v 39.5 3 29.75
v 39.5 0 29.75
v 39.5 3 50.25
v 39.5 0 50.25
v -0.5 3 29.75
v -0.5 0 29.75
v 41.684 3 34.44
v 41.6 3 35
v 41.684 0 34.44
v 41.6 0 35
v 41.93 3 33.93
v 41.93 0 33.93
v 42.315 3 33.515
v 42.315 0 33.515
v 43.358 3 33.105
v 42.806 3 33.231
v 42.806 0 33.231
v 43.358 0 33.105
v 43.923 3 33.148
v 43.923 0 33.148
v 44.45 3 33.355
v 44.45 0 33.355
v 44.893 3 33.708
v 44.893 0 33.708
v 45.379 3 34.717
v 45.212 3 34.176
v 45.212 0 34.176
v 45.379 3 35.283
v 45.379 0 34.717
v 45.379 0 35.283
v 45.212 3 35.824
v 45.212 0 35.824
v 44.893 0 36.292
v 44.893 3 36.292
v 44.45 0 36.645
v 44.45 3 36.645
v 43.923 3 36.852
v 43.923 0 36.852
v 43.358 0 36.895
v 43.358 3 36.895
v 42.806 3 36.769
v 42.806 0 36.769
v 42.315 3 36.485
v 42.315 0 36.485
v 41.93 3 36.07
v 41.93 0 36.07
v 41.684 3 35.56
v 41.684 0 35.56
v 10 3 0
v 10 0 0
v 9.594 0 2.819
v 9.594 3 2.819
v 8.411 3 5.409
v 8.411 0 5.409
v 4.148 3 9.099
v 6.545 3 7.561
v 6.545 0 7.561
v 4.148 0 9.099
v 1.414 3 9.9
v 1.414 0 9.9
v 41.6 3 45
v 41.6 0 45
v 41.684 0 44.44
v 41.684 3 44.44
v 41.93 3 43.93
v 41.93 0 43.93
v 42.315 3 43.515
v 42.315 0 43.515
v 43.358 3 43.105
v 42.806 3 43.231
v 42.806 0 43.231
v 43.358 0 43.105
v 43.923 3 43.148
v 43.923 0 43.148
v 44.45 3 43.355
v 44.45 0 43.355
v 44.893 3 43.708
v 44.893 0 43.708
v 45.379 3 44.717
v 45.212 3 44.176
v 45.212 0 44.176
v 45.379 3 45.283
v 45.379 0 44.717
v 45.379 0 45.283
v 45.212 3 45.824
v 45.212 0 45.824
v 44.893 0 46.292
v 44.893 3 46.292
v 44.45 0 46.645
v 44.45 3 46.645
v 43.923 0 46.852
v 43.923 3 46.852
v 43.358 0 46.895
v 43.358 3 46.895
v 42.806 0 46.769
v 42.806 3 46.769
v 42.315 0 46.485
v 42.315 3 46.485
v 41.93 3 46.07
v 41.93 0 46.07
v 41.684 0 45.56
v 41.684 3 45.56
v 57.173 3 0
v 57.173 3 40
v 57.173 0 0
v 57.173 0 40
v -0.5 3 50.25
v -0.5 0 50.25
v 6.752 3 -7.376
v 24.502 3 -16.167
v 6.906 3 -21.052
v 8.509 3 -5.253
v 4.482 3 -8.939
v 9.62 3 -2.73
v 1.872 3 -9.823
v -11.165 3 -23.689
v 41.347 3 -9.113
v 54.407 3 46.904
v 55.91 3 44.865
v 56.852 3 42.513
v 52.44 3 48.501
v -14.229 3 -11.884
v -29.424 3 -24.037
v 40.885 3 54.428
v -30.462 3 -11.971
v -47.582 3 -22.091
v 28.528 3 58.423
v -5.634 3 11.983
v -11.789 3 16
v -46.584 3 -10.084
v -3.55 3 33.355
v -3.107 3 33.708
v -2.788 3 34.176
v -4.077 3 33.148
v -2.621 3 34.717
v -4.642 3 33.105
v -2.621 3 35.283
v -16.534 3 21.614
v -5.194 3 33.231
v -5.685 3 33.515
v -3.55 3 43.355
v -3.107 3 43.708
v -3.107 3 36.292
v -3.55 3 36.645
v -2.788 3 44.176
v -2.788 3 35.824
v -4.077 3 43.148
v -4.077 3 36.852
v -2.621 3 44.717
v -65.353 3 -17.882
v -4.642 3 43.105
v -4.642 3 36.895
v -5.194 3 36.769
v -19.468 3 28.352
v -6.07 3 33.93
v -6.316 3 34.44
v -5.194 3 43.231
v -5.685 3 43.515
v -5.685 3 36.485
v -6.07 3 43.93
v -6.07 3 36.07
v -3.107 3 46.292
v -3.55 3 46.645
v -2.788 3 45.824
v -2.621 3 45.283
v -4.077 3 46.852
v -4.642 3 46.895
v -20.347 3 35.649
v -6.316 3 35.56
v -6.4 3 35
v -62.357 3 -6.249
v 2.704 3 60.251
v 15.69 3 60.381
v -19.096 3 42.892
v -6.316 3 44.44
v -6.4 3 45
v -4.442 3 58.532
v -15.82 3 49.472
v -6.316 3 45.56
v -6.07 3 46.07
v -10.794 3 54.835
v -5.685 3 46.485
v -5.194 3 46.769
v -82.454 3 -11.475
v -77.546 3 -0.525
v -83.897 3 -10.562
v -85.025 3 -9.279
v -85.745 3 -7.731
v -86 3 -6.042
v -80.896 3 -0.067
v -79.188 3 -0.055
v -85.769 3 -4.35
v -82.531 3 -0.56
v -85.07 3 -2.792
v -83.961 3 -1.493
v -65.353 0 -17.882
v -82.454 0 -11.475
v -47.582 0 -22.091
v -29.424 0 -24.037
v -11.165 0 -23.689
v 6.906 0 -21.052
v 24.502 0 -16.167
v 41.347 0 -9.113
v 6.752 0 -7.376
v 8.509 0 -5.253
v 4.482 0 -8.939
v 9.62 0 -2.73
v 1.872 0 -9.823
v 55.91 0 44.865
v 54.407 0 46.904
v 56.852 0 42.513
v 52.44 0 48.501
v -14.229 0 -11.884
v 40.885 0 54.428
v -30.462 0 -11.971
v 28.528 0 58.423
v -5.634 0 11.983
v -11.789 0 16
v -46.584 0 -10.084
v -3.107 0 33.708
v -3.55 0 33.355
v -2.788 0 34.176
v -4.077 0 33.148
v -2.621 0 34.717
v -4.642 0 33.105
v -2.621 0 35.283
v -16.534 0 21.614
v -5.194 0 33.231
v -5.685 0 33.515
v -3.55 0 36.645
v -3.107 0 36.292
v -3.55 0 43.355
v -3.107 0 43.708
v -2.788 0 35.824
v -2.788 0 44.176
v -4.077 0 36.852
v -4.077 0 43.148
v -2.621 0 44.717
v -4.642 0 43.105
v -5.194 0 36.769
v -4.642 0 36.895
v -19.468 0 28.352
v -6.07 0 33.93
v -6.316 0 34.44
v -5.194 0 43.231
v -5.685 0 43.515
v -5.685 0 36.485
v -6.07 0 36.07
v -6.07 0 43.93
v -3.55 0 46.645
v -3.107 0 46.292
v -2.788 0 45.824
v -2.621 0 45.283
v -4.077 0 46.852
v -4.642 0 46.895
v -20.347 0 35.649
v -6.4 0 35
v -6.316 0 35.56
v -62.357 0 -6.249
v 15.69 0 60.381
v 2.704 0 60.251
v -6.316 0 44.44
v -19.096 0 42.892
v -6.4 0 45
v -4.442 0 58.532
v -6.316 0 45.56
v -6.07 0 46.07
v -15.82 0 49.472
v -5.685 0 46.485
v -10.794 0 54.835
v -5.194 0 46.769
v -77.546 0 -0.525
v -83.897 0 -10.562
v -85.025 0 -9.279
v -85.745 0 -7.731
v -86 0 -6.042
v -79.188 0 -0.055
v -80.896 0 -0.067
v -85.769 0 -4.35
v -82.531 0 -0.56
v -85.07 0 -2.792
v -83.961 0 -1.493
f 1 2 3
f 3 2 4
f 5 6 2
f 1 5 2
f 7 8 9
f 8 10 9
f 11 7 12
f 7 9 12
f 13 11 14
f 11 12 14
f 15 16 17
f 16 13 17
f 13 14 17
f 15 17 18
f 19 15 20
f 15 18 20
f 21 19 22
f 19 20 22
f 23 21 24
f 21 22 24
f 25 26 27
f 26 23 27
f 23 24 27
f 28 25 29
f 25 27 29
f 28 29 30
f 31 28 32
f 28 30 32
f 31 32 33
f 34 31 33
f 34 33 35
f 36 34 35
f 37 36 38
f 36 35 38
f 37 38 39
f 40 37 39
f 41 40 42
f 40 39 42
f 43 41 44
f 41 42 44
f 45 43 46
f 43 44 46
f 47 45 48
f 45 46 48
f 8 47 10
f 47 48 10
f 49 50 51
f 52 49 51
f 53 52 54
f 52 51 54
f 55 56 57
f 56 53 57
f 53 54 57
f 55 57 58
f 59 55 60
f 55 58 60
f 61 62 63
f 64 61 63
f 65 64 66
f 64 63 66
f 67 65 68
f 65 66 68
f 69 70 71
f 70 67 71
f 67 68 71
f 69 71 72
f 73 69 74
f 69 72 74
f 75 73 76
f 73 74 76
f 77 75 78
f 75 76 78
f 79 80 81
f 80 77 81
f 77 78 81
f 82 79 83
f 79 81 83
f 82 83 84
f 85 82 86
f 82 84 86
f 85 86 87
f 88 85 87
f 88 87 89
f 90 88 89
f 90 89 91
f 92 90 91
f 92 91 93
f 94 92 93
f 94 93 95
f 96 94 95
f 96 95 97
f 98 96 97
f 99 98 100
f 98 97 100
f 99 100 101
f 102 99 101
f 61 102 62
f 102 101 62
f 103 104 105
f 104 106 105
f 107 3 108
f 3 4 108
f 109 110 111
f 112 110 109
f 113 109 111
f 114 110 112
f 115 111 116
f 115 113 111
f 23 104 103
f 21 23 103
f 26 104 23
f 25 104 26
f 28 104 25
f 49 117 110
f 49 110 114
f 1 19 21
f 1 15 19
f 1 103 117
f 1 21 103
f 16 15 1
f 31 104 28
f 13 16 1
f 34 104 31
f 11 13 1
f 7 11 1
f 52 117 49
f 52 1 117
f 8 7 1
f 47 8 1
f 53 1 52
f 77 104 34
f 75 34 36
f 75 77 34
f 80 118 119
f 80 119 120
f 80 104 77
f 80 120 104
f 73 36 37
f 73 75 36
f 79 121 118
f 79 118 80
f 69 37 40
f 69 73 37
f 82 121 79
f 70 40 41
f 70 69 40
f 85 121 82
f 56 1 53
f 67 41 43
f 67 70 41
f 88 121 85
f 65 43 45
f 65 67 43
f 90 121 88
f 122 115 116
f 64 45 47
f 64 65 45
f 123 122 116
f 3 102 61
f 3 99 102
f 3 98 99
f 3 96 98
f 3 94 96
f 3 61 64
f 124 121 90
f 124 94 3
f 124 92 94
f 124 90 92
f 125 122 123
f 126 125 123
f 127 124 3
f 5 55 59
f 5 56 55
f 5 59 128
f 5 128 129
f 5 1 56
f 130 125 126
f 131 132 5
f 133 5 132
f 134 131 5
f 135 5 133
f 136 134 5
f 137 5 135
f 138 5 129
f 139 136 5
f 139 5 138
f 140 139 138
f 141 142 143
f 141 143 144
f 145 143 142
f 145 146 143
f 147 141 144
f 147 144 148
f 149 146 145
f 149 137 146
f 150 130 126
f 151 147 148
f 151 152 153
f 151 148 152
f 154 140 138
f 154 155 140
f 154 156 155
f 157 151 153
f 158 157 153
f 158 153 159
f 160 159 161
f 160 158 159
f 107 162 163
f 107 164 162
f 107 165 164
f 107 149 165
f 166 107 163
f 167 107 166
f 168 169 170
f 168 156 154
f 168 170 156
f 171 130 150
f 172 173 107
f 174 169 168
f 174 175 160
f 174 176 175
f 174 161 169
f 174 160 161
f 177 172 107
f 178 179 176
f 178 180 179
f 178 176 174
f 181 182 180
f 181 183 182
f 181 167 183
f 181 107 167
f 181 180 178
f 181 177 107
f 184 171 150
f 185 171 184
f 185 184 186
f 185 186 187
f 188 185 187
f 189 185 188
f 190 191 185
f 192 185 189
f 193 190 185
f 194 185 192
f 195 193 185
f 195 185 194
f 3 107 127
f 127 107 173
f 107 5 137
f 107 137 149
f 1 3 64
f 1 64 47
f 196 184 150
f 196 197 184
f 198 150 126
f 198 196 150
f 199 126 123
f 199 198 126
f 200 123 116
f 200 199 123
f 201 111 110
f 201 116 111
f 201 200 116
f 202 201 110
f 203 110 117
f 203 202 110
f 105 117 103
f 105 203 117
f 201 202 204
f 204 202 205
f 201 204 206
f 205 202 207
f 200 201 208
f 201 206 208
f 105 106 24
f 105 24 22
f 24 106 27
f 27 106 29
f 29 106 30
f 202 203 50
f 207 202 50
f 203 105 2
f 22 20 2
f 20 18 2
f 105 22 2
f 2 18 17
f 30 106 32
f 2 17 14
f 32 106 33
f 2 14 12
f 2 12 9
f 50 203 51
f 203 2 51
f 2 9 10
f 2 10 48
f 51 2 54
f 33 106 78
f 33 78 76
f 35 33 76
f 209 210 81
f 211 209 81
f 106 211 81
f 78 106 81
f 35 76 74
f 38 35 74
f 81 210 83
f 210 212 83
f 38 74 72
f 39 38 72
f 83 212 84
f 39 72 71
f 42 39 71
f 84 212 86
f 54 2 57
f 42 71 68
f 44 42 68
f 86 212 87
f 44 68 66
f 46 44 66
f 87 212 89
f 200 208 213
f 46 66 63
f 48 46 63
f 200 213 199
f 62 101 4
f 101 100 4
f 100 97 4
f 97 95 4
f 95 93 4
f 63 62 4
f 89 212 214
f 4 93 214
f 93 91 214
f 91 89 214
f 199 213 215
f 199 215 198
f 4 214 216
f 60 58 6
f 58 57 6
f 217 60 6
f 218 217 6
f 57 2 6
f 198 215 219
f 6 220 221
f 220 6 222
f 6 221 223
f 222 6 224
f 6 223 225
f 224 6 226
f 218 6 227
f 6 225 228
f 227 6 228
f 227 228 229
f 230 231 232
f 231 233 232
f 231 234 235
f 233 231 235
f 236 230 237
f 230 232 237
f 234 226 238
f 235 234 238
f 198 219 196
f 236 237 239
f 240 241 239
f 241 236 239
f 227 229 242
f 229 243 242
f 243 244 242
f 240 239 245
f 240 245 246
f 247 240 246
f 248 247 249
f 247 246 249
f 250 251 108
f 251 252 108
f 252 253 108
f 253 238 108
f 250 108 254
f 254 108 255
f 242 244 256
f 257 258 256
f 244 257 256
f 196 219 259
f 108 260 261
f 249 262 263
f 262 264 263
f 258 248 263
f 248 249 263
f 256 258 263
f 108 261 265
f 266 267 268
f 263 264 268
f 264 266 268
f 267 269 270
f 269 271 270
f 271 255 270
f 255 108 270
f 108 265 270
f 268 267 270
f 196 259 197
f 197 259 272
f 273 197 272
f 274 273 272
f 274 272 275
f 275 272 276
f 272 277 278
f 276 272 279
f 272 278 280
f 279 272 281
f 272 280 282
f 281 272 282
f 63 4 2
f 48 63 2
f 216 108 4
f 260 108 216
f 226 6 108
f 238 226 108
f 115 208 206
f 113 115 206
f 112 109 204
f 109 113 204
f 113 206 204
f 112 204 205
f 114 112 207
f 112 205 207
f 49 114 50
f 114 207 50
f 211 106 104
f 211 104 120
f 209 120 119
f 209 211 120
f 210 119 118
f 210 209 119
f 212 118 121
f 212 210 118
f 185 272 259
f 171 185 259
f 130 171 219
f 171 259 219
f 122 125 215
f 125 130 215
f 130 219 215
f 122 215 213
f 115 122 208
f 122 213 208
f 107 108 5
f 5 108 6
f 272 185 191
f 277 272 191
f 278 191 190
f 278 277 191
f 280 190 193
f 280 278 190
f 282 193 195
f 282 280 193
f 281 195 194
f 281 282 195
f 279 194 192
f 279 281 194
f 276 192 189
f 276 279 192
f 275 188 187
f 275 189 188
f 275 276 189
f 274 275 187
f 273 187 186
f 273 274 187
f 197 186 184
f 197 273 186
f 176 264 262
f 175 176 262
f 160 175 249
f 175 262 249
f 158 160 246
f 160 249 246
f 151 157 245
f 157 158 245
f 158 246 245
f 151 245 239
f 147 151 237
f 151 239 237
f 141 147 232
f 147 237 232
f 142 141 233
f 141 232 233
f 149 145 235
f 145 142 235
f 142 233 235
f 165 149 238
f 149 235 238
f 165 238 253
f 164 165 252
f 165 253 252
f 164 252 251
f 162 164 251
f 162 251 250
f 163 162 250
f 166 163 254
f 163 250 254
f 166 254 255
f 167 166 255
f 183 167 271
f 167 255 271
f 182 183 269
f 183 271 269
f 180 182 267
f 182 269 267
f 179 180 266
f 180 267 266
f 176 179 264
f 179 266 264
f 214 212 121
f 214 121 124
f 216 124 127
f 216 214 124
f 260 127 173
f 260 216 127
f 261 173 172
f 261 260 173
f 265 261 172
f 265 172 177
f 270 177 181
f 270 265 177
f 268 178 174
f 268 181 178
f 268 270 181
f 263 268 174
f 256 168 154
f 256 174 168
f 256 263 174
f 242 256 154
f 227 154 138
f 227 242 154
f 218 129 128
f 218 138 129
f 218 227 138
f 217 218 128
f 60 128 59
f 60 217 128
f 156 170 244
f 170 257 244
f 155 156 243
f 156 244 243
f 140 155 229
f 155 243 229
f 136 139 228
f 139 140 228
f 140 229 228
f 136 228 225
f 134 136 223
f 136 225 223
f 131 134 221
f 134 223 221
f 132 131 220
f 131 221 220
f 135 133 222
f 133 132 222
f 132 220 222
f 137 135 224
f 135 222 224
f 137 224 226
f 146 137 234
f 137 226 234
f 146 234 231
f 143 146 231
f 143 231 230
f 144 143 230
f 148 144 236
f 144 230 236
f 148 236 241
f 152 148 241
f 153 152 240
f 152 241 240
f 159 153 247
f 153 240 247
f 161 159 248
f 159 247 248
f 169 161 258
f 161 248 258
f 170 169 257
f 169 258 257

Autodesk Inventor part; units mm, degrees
ref_plane "YZ Plane" through (0, 0, 0) normal (1, 0, 0) x (0, 1, 0)
ref_plane "XZ Plane" through (0, 0, 0) normal (0, 1, 0) x (-1, 0, 0)
ref_plane "XY Plane" through (0, 0, 0) normal (0, 0, 1) x (1, 0, 0)
sketch "Sketch1" plane through (0, 0, 0) normal (0, 1, 0) x (-1, 0, 0)
  arc A0 (-1.4142, 9.8995) -> (-10, 0) centre (0, 0) ccw
  line L0 (-39.5, 50.25) -> (0.5, 50.25)
  line L1 (0.5, 50.25) -> (0.5, 29.75)
  line L2 (0.5, 29.75) -> (-39.5, 29.75)
  line L3 (-39.5, 29.75) -> (-39.5, 50.25)
  line L4 (-39.5, 50.25) -> (0.5, 29.75) construction
  line L5 (0.5, 50.25) -> (-39.5, 29.75) construction
  line L6 (-10, 40) -> (-19.5, 40) construction
  circle A1 centre (4.5, 35) radius 1.9
  circle A2 centre (4.5, 45) radius 1.9
  line L7 (4.5, 45) -> (4.5, 35) construction
  circle A3 centre (-43.5, 45) radius 1.9
  circle A4 centre (-43.5, 35) radius 1.9
  line L8 (-43.5, 45) -> (-43.5, 35) construction
  line L9 (-43.5, 40) -> (-19.5, 40) construction
  line L10 (-10, 40) -> (4.5, 40) construction
  line L11 (-43.5, 45) -> (4.5, 45) construction
  line L12 (-43.5, 35) -> (4.5, 35) construction
  line L13 (-19.5, 40) -> (-19.5, 45) construction
  circle A5 centre (-10, 40) radius 9.75 construction
  circle A6 centre (-29, 40) radius 9.75 construction
  arc A7 (-2.7044, 60.2512) -> (-52.4397, 48.5007) centre (-10, -20) ccw
  arc A8 (-1.4142, 9.8995) -> (-2.7044, 60.2512) centre (-5, 35) ccw
  line L14 (-57.1731, 40) -> (-57.1731, 0)
  line L15 (-57.1731, 0) -> (0, 0) construction
  arc A9 (-52.4397, 48.5007) -> (-57.1731, 40) centre (-47.1731, 40) ccw
  line L16 (0, 0) -> (10, 0) construction
  line L17 (-10, 0) -> (-57.1731, 0) construction
  arc A10 (-10, 0) -> (-1.4142, -9.8995) centre (0, 0) ccw
  arc A11 (-1.8715, -9.8233) -> (77.546, -0.5248) centre (23.0596, 121.0399) ccw
  arc A12 (82.454, -11.4752) -> (77.546, -0.5248) centre (80, -6) ccw
  arc A13 (-57.1731, 0) -> (82.454, -11.4752) centre (23.0596, 121.0399) ccw
  line L18 (0, 0) -> (100, 0) construction
  point P0 (-57.1731, 45.3313)
  point P1 (-5, -35)
  dimension "d0" = 20
  dimension "d1" = 40
  dimension "d2" = 20.5
  dimension "d4" = 48
  dimension "d5" = 3.8
  dimension "d6" = 10
  dimension "d7" = 19.5
  dimension "d8" = 10
  dimension "d9" = 40
  dimension "d11" = 10.5
  dimension "d12" = 35
  dimension "d13" = 5
  dimension "d16" = 10
  dimension "d17" = 20
  dimension "d18" = 10
  dimension "d19" = 40
  dimension "d47" = 12
  dimension "d48" = 100
  dimension "d49" = 80
  dimension "d60" = 14.5
extrude "Extrusion1" add sketch "Sketch1" along normal blind 3
equation "\"d11\" = d3"
equation "\"d3\" = 10.5"
properties part number "wstepna_geometria_wersja_2"
